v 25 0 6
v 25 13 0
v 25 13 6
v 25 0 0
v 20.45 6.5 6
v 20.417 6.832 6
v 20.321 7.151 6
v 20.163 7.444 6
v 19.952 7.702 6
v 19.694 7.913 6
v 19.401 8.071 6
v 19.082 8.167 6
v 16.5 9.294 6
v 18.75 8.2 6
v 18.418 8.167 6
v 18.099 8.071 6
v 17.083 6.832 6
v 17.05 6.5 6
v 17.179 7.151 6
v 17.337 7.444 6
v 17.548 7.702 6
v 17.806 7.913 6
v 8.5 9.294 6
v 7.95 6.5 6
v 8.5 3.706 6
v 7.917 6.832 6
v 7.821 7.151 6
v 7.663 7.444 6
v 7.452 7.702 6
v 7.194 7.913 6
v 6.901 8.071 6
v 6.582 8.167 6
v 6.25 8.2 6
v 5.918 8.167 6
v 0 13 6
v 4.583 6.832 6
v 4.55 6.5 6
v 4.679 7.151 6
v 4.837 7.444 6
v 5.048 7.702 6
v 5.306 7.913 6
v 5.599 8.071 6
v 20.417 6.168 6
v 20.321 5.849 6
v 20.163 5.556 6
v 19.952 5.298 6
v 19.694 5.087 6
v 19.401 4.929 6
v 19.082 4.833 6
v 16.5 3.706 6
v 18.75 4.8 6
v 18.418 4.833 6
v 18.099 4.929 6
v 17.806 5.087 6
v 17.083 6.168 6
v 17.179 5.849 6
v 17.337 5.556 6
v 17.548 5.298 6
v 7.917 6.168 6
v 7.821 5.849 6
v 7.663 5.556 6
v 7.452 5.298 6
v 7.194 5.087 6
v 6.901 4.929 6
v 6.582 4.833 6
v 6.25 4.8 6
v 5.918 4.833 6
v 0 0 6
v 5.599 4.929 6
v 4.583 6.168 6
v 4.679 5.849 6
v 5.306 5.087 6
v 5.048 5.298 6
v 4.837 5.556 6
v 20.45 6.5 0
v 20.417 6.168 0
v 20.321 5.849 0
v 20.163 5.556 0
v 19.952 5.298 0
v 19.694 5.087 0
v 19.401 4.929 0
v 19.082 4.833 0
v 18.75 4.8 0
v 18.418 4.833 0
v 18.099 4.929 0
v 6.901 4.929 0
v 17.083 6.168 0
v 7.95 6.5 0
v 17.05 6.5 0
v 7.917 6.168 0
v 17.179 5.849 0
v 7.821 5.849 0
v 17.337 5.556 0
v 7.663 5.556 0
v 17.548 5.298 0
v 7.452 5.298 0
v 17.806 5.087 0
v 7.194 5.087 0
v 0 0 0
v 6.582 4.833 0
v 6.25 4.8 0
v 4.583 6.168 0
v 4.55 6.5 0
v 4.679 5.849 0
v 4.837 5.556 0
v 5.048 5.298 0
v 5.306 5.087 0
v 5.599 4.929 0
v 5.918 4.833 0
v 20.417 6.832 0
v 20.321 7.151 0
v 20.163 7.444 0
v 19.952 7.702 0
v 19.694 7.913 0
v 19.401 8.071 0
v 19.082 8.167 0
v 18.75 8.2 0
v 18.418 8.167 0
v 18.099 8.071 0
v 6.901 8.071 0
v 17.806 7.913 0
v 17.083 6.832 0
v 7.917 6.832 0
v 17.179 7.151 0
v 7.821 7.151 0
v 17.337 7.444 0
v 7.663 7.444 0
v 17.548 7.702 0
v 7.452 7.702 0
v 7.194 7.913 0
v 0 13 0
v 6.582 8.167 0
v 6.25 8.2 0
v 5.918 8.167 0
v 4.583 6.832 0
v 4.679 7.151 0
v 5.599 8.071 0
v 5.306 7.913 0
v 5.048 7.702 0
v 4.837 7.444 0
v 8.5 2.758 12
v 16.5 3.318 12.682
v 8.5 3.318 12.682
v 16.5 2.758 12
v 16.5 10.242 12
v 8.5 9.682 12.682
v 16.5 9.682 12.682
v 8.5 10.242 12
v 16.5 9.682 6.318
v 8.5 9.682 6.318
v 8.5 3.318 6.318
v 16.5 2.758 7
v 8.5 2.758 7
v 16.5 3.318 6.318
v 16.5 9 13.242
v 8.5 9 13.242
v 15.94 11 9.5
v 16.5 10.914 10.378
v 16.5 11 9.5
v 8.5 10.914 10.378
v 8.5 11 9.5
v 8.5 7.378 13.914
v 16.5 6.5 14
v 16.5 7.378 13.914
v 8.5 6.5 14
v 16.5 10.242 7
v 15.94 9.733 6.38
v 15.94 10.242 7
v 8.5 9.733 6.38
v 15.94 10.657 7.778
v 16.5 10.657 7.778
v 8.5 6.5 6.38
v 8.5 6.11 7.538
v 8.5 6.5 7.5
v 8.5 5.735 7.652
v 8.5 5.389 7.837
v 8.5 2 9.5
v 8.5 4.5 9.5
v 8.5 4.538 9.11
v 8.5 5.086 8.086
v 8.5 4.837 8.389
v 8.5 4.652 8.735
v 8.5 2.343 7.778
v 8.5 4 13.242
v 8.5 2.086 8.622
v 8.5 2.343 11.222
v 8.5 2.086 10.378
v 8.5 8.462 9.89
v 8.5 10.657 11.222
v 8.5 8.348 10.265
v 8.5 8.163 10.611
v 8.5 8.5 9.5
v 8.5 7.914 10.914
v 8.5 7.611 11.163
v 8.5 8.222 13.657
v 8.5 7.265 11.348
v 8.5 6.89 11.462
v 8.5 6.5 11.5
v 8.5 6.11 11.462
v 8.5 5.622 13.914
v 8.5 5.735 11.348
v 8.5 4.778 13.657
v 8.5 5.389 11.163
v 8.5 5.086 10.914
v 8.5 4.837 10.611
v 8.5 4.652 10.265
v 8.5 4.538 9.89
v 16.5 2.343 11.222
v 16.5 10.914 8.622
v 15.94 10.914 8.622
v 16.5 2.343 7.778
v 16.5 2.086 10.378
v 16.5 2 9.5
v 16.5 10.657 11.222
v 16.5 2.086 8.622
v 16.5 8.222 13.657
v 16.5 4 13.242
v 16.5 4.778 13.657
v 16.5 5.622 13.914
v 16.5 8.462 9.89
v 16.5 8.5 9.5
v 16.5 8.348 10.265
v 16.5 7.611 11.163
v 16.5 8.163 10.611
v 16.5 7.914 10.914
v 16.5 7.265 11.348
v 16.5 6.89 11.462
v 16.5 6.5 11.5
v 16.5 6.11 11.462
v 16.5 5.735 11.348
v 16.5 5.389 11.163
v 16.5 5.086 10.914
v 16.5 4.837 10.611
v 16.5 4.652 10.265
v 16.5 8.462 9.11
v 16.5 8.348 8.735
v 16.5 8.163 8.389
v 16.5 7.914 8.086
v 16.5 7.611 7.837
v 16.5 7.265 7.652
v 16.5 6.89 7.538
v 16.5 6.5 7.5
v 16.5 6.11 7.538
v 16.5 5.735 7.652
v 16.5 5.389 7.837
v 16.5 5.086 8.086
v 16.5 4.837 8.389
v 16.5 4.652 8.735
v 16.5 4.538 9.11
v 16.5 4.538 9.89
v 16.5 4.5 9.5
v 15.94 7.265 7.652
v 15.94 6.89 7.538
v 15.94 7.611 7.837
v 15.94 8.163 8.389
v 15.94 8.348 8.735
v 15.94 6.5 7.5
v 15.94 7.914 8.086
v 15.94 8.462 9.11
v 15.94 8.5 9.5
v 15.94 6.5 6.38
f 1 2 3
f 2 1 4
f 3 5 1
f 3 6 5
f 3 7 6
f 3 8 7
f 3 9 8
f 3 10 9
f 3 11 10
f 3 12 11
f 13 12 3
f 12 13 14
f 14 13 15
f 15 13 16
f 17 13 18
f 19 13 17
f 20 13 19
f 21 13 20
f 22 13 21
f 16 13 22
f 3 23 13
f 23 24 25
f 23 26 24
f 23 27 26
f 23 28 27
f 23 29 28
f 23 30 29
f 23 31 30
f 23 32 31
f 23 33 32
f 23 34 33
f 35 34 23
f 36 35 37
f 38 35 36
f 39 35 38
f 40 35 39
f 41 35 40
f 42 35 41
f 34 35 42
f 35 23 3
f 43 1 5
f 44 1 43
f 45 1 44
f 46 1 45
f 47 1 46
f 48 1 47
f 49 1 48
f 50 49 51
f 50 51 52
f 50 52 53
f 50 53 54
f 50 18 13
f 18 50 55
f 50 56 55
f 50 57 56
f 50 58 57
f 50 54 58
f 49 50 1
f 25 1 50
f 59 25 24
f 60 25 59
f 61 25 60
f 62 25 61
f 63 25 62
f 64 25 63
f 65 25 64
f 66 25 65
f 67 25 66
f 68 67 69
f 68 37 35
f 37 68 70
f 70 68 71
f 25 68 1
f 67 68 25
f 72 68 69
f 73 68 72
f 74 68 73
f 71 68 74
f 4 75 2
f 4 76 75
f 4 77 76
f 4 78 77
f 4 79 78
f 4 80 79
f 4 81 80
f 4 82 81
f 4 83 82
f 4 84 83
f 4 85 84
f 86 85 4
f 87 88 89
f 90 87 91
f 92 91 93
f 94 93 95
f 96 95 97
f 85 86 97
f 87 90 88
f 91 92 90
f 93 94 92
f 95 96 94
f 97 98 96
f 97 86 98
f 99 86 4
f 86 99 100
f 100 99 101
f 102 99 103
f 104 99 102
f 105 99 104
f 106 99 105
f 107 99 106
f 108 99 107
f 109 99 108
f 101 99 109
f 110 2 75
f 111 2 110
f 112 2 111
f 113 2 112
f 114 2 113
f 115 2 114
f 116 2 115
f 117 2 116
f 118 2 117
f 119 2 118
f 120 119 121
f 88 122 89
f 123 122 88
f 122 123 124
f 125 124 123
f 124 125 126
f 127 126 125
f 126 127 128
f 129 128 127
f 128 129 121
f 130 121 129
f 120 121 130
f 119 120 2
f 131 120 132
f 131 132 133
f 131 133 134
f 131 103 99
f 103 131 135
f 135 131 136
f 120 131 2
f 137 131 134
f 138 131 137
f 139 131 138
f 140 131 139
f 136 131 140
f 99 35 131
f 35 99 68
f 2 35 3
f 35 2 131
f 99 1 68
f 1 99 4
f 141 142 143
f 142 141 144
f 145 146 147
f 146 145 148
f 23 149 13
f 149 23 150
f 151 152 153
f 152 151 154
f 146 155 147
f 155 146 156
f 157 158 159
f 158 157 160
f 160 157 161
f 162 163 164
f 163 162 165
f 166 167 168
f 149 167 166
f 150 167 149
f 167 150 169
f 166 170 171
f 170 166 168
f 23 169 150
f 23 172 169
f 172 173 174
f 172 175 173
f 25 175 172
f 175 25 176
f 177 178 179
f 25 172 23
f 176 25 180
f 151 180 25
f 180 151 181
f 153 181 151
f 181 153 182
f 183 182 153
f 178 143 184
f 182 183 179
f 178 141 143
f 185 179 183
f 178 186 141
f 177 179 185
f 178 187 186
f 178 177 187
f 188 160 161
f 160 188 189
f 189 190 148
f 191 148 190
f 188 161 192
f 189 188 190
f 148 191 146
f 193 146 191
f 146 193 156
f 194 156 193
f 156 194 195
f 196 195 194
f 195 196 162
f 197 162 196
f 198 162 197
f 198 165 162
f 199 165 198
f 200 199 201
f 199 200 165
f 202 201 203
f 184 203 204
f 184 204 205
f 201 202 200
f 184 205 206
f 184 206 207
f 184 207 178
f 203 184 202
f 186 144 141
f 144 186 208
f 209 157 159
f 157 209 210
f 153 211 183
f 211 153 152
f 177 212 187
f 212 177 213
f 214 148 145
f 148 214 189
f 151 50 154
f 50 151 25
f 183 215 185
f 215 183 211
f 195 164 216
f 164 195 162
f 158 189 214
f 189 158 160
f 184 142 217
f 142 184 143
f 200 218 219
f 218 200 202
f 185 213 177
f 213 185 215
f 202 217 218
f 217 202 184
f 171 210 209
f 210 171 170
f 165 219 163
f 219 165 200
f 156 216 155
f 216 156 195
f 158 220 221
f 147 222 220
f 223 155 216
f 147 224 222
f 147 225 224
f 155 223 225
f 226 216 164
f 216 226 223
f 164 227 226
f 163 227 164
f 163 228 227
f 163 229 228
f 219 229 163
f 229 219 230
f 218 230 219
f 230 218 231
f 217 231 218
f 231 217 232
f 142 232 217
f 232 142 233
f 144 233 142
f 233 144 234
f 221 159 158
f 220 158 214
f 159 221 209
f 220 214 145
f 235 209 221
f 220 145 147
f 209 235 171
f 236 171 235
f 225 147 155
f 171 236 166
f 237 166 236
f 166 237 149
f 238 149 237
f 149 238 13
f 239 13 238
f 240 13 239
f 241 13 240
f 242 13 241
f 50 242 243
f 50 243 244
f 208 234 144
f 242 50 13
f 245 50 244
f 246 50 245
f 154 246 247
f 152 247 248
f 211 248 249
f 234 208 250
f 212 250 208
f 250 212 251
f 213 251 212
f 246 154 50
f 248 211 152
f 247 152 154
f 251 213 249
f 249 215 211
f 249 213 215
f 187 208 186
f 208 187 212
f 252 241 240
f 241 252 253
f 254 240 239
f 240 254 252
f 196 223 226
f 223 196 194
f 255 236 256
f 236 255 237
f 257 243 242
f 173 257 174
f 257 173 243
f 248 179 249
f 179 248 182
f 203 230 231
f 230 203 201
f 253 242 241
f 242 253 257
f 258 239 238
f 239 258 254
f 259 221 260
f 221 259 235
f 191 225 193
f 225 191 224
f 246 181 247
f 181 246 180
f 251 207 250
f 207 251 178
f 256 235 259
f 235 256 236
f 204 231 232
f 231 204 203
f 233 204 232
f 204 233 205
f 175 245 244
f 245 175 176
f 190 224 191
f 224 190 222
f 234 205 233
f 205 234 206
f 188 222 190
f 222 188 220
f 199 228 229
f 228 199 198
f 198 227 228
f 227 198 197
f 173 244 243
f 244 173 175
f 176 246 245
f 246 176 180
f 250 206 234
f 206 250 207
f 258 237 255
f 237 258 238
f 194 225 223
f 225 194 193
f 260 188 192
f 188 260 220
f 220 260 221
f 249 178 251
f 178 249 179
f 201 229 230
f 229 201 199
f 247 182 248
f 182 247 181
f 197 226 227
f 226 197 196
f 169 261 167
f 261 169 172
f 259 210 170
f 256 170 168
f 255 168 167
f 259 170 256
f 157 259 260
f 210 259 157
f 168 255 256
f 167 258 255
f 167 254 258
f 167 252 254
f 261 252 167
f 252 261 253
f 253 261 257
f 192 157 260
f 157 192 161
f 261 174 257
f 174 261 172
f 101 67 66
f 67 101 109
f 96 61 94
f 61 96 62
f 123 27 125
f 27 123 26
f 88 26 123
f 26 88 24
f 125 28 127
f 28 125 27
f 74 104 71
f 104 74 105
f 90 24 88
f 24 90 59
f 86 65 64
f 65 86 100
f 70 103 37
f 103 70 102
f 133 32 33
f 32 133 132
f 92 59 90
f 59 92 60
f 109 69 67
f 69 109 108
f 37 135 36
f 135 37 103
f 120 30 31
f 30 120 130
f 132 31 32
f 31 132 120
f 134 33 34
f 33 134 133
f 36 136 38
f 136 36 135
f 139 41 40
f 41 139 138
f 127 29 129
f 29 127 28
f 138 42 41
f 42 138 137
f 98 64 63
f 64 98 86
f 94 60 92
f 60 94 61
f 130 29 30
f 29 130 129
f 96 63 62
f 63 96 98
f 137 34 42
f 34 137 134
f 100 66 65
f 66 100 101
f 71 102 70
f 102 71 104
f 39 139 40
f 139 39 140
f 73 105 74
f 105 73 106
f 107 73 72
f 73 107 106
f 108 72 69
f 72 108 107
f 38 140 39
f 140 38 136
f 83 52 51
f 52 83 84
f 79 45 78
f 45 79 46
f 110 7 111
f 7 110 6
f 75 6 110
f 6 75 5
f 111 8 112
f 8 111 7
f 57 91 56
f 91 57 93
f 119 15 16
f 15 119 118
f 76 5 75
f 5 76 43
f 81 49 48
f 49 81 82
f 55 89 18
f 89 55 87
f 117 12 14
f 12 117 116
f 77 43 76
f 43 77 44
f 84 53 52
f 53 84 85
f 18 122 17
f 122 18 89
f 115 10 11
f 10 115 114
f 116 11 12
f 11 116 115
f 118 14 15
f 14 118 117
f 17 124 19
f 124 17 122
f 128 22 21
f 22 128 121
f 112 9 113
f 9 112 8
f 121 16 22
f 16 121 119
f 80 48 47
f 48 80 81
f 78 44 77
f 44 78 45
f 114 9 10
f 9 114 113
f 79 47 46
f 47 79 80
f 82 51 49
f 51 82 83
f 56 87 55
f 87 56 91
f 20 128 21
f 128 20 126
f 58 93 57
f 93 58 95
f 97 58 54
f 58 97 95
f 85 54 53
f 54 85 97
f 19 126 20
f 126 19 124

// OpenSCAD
$fn = 32;

// ----------------------------------------------------------------------
// Cable clip: cable 4 mm, clamp 9 mm, base 25 mm
// ----------------------------------------------------------------------

// --- parameters (mm) ---
plate_x = 25;             // base length, X
plate_y = 13;             // base width, Y
plate_t = 6;              // base thickness
wire_seat_d = 9;          // clamp outside diameter
clip_t = 2.5;             // clamp wall
cable_d = 4;              // cable opening
ring_w = 8;               // clamp width along the cable
screw_d = 3.4;            // screw clearance
throat = 3.12;            // snap throat width
sink = 1;                 // overlap of the clamp into the base

module base() {
  cube([plate_x, plate_y, plate_t]);
}

module clamp() {
  translate([plate_x / 2, plate_y / 2, plate_t + wire_seat_d / 2 - sink]) rotate([0, 90, 0])
    cylinder(h = ring_w, d = wire_seat_d, center = true);
}

difference() {
  union() {
    base();
    clamp();
  }
  translate([plate_x / 2, plate_y / 2, plate_t + wire_seat_d / 2 - sink]) rotate([0, 90, 0]) translate([0, 0, -ring_w / 2 - 1]) cylinder(h = ring_w + 2, d = cable_d);
  /* snap throat: the opening is narrower than the cable */
  translate([plate_x / 2 - throat / 2, plate_y / 2, plate_t + wire_seat_d / 2 - sink]) rotate([0, 90, 0]) translate([0, 0, -ring_w / 2 - 1]) cube([throat, wire_seat_d + 2, ring_w + 2]);
  translate([6.25, plate_y / 2, -1]) cylinder(h = plate_t + 2, d = screw_d);
  translate([18.75, plate_y / 2, -1]) cylinder(h = plate_t + 2, d = screw_d);
}
